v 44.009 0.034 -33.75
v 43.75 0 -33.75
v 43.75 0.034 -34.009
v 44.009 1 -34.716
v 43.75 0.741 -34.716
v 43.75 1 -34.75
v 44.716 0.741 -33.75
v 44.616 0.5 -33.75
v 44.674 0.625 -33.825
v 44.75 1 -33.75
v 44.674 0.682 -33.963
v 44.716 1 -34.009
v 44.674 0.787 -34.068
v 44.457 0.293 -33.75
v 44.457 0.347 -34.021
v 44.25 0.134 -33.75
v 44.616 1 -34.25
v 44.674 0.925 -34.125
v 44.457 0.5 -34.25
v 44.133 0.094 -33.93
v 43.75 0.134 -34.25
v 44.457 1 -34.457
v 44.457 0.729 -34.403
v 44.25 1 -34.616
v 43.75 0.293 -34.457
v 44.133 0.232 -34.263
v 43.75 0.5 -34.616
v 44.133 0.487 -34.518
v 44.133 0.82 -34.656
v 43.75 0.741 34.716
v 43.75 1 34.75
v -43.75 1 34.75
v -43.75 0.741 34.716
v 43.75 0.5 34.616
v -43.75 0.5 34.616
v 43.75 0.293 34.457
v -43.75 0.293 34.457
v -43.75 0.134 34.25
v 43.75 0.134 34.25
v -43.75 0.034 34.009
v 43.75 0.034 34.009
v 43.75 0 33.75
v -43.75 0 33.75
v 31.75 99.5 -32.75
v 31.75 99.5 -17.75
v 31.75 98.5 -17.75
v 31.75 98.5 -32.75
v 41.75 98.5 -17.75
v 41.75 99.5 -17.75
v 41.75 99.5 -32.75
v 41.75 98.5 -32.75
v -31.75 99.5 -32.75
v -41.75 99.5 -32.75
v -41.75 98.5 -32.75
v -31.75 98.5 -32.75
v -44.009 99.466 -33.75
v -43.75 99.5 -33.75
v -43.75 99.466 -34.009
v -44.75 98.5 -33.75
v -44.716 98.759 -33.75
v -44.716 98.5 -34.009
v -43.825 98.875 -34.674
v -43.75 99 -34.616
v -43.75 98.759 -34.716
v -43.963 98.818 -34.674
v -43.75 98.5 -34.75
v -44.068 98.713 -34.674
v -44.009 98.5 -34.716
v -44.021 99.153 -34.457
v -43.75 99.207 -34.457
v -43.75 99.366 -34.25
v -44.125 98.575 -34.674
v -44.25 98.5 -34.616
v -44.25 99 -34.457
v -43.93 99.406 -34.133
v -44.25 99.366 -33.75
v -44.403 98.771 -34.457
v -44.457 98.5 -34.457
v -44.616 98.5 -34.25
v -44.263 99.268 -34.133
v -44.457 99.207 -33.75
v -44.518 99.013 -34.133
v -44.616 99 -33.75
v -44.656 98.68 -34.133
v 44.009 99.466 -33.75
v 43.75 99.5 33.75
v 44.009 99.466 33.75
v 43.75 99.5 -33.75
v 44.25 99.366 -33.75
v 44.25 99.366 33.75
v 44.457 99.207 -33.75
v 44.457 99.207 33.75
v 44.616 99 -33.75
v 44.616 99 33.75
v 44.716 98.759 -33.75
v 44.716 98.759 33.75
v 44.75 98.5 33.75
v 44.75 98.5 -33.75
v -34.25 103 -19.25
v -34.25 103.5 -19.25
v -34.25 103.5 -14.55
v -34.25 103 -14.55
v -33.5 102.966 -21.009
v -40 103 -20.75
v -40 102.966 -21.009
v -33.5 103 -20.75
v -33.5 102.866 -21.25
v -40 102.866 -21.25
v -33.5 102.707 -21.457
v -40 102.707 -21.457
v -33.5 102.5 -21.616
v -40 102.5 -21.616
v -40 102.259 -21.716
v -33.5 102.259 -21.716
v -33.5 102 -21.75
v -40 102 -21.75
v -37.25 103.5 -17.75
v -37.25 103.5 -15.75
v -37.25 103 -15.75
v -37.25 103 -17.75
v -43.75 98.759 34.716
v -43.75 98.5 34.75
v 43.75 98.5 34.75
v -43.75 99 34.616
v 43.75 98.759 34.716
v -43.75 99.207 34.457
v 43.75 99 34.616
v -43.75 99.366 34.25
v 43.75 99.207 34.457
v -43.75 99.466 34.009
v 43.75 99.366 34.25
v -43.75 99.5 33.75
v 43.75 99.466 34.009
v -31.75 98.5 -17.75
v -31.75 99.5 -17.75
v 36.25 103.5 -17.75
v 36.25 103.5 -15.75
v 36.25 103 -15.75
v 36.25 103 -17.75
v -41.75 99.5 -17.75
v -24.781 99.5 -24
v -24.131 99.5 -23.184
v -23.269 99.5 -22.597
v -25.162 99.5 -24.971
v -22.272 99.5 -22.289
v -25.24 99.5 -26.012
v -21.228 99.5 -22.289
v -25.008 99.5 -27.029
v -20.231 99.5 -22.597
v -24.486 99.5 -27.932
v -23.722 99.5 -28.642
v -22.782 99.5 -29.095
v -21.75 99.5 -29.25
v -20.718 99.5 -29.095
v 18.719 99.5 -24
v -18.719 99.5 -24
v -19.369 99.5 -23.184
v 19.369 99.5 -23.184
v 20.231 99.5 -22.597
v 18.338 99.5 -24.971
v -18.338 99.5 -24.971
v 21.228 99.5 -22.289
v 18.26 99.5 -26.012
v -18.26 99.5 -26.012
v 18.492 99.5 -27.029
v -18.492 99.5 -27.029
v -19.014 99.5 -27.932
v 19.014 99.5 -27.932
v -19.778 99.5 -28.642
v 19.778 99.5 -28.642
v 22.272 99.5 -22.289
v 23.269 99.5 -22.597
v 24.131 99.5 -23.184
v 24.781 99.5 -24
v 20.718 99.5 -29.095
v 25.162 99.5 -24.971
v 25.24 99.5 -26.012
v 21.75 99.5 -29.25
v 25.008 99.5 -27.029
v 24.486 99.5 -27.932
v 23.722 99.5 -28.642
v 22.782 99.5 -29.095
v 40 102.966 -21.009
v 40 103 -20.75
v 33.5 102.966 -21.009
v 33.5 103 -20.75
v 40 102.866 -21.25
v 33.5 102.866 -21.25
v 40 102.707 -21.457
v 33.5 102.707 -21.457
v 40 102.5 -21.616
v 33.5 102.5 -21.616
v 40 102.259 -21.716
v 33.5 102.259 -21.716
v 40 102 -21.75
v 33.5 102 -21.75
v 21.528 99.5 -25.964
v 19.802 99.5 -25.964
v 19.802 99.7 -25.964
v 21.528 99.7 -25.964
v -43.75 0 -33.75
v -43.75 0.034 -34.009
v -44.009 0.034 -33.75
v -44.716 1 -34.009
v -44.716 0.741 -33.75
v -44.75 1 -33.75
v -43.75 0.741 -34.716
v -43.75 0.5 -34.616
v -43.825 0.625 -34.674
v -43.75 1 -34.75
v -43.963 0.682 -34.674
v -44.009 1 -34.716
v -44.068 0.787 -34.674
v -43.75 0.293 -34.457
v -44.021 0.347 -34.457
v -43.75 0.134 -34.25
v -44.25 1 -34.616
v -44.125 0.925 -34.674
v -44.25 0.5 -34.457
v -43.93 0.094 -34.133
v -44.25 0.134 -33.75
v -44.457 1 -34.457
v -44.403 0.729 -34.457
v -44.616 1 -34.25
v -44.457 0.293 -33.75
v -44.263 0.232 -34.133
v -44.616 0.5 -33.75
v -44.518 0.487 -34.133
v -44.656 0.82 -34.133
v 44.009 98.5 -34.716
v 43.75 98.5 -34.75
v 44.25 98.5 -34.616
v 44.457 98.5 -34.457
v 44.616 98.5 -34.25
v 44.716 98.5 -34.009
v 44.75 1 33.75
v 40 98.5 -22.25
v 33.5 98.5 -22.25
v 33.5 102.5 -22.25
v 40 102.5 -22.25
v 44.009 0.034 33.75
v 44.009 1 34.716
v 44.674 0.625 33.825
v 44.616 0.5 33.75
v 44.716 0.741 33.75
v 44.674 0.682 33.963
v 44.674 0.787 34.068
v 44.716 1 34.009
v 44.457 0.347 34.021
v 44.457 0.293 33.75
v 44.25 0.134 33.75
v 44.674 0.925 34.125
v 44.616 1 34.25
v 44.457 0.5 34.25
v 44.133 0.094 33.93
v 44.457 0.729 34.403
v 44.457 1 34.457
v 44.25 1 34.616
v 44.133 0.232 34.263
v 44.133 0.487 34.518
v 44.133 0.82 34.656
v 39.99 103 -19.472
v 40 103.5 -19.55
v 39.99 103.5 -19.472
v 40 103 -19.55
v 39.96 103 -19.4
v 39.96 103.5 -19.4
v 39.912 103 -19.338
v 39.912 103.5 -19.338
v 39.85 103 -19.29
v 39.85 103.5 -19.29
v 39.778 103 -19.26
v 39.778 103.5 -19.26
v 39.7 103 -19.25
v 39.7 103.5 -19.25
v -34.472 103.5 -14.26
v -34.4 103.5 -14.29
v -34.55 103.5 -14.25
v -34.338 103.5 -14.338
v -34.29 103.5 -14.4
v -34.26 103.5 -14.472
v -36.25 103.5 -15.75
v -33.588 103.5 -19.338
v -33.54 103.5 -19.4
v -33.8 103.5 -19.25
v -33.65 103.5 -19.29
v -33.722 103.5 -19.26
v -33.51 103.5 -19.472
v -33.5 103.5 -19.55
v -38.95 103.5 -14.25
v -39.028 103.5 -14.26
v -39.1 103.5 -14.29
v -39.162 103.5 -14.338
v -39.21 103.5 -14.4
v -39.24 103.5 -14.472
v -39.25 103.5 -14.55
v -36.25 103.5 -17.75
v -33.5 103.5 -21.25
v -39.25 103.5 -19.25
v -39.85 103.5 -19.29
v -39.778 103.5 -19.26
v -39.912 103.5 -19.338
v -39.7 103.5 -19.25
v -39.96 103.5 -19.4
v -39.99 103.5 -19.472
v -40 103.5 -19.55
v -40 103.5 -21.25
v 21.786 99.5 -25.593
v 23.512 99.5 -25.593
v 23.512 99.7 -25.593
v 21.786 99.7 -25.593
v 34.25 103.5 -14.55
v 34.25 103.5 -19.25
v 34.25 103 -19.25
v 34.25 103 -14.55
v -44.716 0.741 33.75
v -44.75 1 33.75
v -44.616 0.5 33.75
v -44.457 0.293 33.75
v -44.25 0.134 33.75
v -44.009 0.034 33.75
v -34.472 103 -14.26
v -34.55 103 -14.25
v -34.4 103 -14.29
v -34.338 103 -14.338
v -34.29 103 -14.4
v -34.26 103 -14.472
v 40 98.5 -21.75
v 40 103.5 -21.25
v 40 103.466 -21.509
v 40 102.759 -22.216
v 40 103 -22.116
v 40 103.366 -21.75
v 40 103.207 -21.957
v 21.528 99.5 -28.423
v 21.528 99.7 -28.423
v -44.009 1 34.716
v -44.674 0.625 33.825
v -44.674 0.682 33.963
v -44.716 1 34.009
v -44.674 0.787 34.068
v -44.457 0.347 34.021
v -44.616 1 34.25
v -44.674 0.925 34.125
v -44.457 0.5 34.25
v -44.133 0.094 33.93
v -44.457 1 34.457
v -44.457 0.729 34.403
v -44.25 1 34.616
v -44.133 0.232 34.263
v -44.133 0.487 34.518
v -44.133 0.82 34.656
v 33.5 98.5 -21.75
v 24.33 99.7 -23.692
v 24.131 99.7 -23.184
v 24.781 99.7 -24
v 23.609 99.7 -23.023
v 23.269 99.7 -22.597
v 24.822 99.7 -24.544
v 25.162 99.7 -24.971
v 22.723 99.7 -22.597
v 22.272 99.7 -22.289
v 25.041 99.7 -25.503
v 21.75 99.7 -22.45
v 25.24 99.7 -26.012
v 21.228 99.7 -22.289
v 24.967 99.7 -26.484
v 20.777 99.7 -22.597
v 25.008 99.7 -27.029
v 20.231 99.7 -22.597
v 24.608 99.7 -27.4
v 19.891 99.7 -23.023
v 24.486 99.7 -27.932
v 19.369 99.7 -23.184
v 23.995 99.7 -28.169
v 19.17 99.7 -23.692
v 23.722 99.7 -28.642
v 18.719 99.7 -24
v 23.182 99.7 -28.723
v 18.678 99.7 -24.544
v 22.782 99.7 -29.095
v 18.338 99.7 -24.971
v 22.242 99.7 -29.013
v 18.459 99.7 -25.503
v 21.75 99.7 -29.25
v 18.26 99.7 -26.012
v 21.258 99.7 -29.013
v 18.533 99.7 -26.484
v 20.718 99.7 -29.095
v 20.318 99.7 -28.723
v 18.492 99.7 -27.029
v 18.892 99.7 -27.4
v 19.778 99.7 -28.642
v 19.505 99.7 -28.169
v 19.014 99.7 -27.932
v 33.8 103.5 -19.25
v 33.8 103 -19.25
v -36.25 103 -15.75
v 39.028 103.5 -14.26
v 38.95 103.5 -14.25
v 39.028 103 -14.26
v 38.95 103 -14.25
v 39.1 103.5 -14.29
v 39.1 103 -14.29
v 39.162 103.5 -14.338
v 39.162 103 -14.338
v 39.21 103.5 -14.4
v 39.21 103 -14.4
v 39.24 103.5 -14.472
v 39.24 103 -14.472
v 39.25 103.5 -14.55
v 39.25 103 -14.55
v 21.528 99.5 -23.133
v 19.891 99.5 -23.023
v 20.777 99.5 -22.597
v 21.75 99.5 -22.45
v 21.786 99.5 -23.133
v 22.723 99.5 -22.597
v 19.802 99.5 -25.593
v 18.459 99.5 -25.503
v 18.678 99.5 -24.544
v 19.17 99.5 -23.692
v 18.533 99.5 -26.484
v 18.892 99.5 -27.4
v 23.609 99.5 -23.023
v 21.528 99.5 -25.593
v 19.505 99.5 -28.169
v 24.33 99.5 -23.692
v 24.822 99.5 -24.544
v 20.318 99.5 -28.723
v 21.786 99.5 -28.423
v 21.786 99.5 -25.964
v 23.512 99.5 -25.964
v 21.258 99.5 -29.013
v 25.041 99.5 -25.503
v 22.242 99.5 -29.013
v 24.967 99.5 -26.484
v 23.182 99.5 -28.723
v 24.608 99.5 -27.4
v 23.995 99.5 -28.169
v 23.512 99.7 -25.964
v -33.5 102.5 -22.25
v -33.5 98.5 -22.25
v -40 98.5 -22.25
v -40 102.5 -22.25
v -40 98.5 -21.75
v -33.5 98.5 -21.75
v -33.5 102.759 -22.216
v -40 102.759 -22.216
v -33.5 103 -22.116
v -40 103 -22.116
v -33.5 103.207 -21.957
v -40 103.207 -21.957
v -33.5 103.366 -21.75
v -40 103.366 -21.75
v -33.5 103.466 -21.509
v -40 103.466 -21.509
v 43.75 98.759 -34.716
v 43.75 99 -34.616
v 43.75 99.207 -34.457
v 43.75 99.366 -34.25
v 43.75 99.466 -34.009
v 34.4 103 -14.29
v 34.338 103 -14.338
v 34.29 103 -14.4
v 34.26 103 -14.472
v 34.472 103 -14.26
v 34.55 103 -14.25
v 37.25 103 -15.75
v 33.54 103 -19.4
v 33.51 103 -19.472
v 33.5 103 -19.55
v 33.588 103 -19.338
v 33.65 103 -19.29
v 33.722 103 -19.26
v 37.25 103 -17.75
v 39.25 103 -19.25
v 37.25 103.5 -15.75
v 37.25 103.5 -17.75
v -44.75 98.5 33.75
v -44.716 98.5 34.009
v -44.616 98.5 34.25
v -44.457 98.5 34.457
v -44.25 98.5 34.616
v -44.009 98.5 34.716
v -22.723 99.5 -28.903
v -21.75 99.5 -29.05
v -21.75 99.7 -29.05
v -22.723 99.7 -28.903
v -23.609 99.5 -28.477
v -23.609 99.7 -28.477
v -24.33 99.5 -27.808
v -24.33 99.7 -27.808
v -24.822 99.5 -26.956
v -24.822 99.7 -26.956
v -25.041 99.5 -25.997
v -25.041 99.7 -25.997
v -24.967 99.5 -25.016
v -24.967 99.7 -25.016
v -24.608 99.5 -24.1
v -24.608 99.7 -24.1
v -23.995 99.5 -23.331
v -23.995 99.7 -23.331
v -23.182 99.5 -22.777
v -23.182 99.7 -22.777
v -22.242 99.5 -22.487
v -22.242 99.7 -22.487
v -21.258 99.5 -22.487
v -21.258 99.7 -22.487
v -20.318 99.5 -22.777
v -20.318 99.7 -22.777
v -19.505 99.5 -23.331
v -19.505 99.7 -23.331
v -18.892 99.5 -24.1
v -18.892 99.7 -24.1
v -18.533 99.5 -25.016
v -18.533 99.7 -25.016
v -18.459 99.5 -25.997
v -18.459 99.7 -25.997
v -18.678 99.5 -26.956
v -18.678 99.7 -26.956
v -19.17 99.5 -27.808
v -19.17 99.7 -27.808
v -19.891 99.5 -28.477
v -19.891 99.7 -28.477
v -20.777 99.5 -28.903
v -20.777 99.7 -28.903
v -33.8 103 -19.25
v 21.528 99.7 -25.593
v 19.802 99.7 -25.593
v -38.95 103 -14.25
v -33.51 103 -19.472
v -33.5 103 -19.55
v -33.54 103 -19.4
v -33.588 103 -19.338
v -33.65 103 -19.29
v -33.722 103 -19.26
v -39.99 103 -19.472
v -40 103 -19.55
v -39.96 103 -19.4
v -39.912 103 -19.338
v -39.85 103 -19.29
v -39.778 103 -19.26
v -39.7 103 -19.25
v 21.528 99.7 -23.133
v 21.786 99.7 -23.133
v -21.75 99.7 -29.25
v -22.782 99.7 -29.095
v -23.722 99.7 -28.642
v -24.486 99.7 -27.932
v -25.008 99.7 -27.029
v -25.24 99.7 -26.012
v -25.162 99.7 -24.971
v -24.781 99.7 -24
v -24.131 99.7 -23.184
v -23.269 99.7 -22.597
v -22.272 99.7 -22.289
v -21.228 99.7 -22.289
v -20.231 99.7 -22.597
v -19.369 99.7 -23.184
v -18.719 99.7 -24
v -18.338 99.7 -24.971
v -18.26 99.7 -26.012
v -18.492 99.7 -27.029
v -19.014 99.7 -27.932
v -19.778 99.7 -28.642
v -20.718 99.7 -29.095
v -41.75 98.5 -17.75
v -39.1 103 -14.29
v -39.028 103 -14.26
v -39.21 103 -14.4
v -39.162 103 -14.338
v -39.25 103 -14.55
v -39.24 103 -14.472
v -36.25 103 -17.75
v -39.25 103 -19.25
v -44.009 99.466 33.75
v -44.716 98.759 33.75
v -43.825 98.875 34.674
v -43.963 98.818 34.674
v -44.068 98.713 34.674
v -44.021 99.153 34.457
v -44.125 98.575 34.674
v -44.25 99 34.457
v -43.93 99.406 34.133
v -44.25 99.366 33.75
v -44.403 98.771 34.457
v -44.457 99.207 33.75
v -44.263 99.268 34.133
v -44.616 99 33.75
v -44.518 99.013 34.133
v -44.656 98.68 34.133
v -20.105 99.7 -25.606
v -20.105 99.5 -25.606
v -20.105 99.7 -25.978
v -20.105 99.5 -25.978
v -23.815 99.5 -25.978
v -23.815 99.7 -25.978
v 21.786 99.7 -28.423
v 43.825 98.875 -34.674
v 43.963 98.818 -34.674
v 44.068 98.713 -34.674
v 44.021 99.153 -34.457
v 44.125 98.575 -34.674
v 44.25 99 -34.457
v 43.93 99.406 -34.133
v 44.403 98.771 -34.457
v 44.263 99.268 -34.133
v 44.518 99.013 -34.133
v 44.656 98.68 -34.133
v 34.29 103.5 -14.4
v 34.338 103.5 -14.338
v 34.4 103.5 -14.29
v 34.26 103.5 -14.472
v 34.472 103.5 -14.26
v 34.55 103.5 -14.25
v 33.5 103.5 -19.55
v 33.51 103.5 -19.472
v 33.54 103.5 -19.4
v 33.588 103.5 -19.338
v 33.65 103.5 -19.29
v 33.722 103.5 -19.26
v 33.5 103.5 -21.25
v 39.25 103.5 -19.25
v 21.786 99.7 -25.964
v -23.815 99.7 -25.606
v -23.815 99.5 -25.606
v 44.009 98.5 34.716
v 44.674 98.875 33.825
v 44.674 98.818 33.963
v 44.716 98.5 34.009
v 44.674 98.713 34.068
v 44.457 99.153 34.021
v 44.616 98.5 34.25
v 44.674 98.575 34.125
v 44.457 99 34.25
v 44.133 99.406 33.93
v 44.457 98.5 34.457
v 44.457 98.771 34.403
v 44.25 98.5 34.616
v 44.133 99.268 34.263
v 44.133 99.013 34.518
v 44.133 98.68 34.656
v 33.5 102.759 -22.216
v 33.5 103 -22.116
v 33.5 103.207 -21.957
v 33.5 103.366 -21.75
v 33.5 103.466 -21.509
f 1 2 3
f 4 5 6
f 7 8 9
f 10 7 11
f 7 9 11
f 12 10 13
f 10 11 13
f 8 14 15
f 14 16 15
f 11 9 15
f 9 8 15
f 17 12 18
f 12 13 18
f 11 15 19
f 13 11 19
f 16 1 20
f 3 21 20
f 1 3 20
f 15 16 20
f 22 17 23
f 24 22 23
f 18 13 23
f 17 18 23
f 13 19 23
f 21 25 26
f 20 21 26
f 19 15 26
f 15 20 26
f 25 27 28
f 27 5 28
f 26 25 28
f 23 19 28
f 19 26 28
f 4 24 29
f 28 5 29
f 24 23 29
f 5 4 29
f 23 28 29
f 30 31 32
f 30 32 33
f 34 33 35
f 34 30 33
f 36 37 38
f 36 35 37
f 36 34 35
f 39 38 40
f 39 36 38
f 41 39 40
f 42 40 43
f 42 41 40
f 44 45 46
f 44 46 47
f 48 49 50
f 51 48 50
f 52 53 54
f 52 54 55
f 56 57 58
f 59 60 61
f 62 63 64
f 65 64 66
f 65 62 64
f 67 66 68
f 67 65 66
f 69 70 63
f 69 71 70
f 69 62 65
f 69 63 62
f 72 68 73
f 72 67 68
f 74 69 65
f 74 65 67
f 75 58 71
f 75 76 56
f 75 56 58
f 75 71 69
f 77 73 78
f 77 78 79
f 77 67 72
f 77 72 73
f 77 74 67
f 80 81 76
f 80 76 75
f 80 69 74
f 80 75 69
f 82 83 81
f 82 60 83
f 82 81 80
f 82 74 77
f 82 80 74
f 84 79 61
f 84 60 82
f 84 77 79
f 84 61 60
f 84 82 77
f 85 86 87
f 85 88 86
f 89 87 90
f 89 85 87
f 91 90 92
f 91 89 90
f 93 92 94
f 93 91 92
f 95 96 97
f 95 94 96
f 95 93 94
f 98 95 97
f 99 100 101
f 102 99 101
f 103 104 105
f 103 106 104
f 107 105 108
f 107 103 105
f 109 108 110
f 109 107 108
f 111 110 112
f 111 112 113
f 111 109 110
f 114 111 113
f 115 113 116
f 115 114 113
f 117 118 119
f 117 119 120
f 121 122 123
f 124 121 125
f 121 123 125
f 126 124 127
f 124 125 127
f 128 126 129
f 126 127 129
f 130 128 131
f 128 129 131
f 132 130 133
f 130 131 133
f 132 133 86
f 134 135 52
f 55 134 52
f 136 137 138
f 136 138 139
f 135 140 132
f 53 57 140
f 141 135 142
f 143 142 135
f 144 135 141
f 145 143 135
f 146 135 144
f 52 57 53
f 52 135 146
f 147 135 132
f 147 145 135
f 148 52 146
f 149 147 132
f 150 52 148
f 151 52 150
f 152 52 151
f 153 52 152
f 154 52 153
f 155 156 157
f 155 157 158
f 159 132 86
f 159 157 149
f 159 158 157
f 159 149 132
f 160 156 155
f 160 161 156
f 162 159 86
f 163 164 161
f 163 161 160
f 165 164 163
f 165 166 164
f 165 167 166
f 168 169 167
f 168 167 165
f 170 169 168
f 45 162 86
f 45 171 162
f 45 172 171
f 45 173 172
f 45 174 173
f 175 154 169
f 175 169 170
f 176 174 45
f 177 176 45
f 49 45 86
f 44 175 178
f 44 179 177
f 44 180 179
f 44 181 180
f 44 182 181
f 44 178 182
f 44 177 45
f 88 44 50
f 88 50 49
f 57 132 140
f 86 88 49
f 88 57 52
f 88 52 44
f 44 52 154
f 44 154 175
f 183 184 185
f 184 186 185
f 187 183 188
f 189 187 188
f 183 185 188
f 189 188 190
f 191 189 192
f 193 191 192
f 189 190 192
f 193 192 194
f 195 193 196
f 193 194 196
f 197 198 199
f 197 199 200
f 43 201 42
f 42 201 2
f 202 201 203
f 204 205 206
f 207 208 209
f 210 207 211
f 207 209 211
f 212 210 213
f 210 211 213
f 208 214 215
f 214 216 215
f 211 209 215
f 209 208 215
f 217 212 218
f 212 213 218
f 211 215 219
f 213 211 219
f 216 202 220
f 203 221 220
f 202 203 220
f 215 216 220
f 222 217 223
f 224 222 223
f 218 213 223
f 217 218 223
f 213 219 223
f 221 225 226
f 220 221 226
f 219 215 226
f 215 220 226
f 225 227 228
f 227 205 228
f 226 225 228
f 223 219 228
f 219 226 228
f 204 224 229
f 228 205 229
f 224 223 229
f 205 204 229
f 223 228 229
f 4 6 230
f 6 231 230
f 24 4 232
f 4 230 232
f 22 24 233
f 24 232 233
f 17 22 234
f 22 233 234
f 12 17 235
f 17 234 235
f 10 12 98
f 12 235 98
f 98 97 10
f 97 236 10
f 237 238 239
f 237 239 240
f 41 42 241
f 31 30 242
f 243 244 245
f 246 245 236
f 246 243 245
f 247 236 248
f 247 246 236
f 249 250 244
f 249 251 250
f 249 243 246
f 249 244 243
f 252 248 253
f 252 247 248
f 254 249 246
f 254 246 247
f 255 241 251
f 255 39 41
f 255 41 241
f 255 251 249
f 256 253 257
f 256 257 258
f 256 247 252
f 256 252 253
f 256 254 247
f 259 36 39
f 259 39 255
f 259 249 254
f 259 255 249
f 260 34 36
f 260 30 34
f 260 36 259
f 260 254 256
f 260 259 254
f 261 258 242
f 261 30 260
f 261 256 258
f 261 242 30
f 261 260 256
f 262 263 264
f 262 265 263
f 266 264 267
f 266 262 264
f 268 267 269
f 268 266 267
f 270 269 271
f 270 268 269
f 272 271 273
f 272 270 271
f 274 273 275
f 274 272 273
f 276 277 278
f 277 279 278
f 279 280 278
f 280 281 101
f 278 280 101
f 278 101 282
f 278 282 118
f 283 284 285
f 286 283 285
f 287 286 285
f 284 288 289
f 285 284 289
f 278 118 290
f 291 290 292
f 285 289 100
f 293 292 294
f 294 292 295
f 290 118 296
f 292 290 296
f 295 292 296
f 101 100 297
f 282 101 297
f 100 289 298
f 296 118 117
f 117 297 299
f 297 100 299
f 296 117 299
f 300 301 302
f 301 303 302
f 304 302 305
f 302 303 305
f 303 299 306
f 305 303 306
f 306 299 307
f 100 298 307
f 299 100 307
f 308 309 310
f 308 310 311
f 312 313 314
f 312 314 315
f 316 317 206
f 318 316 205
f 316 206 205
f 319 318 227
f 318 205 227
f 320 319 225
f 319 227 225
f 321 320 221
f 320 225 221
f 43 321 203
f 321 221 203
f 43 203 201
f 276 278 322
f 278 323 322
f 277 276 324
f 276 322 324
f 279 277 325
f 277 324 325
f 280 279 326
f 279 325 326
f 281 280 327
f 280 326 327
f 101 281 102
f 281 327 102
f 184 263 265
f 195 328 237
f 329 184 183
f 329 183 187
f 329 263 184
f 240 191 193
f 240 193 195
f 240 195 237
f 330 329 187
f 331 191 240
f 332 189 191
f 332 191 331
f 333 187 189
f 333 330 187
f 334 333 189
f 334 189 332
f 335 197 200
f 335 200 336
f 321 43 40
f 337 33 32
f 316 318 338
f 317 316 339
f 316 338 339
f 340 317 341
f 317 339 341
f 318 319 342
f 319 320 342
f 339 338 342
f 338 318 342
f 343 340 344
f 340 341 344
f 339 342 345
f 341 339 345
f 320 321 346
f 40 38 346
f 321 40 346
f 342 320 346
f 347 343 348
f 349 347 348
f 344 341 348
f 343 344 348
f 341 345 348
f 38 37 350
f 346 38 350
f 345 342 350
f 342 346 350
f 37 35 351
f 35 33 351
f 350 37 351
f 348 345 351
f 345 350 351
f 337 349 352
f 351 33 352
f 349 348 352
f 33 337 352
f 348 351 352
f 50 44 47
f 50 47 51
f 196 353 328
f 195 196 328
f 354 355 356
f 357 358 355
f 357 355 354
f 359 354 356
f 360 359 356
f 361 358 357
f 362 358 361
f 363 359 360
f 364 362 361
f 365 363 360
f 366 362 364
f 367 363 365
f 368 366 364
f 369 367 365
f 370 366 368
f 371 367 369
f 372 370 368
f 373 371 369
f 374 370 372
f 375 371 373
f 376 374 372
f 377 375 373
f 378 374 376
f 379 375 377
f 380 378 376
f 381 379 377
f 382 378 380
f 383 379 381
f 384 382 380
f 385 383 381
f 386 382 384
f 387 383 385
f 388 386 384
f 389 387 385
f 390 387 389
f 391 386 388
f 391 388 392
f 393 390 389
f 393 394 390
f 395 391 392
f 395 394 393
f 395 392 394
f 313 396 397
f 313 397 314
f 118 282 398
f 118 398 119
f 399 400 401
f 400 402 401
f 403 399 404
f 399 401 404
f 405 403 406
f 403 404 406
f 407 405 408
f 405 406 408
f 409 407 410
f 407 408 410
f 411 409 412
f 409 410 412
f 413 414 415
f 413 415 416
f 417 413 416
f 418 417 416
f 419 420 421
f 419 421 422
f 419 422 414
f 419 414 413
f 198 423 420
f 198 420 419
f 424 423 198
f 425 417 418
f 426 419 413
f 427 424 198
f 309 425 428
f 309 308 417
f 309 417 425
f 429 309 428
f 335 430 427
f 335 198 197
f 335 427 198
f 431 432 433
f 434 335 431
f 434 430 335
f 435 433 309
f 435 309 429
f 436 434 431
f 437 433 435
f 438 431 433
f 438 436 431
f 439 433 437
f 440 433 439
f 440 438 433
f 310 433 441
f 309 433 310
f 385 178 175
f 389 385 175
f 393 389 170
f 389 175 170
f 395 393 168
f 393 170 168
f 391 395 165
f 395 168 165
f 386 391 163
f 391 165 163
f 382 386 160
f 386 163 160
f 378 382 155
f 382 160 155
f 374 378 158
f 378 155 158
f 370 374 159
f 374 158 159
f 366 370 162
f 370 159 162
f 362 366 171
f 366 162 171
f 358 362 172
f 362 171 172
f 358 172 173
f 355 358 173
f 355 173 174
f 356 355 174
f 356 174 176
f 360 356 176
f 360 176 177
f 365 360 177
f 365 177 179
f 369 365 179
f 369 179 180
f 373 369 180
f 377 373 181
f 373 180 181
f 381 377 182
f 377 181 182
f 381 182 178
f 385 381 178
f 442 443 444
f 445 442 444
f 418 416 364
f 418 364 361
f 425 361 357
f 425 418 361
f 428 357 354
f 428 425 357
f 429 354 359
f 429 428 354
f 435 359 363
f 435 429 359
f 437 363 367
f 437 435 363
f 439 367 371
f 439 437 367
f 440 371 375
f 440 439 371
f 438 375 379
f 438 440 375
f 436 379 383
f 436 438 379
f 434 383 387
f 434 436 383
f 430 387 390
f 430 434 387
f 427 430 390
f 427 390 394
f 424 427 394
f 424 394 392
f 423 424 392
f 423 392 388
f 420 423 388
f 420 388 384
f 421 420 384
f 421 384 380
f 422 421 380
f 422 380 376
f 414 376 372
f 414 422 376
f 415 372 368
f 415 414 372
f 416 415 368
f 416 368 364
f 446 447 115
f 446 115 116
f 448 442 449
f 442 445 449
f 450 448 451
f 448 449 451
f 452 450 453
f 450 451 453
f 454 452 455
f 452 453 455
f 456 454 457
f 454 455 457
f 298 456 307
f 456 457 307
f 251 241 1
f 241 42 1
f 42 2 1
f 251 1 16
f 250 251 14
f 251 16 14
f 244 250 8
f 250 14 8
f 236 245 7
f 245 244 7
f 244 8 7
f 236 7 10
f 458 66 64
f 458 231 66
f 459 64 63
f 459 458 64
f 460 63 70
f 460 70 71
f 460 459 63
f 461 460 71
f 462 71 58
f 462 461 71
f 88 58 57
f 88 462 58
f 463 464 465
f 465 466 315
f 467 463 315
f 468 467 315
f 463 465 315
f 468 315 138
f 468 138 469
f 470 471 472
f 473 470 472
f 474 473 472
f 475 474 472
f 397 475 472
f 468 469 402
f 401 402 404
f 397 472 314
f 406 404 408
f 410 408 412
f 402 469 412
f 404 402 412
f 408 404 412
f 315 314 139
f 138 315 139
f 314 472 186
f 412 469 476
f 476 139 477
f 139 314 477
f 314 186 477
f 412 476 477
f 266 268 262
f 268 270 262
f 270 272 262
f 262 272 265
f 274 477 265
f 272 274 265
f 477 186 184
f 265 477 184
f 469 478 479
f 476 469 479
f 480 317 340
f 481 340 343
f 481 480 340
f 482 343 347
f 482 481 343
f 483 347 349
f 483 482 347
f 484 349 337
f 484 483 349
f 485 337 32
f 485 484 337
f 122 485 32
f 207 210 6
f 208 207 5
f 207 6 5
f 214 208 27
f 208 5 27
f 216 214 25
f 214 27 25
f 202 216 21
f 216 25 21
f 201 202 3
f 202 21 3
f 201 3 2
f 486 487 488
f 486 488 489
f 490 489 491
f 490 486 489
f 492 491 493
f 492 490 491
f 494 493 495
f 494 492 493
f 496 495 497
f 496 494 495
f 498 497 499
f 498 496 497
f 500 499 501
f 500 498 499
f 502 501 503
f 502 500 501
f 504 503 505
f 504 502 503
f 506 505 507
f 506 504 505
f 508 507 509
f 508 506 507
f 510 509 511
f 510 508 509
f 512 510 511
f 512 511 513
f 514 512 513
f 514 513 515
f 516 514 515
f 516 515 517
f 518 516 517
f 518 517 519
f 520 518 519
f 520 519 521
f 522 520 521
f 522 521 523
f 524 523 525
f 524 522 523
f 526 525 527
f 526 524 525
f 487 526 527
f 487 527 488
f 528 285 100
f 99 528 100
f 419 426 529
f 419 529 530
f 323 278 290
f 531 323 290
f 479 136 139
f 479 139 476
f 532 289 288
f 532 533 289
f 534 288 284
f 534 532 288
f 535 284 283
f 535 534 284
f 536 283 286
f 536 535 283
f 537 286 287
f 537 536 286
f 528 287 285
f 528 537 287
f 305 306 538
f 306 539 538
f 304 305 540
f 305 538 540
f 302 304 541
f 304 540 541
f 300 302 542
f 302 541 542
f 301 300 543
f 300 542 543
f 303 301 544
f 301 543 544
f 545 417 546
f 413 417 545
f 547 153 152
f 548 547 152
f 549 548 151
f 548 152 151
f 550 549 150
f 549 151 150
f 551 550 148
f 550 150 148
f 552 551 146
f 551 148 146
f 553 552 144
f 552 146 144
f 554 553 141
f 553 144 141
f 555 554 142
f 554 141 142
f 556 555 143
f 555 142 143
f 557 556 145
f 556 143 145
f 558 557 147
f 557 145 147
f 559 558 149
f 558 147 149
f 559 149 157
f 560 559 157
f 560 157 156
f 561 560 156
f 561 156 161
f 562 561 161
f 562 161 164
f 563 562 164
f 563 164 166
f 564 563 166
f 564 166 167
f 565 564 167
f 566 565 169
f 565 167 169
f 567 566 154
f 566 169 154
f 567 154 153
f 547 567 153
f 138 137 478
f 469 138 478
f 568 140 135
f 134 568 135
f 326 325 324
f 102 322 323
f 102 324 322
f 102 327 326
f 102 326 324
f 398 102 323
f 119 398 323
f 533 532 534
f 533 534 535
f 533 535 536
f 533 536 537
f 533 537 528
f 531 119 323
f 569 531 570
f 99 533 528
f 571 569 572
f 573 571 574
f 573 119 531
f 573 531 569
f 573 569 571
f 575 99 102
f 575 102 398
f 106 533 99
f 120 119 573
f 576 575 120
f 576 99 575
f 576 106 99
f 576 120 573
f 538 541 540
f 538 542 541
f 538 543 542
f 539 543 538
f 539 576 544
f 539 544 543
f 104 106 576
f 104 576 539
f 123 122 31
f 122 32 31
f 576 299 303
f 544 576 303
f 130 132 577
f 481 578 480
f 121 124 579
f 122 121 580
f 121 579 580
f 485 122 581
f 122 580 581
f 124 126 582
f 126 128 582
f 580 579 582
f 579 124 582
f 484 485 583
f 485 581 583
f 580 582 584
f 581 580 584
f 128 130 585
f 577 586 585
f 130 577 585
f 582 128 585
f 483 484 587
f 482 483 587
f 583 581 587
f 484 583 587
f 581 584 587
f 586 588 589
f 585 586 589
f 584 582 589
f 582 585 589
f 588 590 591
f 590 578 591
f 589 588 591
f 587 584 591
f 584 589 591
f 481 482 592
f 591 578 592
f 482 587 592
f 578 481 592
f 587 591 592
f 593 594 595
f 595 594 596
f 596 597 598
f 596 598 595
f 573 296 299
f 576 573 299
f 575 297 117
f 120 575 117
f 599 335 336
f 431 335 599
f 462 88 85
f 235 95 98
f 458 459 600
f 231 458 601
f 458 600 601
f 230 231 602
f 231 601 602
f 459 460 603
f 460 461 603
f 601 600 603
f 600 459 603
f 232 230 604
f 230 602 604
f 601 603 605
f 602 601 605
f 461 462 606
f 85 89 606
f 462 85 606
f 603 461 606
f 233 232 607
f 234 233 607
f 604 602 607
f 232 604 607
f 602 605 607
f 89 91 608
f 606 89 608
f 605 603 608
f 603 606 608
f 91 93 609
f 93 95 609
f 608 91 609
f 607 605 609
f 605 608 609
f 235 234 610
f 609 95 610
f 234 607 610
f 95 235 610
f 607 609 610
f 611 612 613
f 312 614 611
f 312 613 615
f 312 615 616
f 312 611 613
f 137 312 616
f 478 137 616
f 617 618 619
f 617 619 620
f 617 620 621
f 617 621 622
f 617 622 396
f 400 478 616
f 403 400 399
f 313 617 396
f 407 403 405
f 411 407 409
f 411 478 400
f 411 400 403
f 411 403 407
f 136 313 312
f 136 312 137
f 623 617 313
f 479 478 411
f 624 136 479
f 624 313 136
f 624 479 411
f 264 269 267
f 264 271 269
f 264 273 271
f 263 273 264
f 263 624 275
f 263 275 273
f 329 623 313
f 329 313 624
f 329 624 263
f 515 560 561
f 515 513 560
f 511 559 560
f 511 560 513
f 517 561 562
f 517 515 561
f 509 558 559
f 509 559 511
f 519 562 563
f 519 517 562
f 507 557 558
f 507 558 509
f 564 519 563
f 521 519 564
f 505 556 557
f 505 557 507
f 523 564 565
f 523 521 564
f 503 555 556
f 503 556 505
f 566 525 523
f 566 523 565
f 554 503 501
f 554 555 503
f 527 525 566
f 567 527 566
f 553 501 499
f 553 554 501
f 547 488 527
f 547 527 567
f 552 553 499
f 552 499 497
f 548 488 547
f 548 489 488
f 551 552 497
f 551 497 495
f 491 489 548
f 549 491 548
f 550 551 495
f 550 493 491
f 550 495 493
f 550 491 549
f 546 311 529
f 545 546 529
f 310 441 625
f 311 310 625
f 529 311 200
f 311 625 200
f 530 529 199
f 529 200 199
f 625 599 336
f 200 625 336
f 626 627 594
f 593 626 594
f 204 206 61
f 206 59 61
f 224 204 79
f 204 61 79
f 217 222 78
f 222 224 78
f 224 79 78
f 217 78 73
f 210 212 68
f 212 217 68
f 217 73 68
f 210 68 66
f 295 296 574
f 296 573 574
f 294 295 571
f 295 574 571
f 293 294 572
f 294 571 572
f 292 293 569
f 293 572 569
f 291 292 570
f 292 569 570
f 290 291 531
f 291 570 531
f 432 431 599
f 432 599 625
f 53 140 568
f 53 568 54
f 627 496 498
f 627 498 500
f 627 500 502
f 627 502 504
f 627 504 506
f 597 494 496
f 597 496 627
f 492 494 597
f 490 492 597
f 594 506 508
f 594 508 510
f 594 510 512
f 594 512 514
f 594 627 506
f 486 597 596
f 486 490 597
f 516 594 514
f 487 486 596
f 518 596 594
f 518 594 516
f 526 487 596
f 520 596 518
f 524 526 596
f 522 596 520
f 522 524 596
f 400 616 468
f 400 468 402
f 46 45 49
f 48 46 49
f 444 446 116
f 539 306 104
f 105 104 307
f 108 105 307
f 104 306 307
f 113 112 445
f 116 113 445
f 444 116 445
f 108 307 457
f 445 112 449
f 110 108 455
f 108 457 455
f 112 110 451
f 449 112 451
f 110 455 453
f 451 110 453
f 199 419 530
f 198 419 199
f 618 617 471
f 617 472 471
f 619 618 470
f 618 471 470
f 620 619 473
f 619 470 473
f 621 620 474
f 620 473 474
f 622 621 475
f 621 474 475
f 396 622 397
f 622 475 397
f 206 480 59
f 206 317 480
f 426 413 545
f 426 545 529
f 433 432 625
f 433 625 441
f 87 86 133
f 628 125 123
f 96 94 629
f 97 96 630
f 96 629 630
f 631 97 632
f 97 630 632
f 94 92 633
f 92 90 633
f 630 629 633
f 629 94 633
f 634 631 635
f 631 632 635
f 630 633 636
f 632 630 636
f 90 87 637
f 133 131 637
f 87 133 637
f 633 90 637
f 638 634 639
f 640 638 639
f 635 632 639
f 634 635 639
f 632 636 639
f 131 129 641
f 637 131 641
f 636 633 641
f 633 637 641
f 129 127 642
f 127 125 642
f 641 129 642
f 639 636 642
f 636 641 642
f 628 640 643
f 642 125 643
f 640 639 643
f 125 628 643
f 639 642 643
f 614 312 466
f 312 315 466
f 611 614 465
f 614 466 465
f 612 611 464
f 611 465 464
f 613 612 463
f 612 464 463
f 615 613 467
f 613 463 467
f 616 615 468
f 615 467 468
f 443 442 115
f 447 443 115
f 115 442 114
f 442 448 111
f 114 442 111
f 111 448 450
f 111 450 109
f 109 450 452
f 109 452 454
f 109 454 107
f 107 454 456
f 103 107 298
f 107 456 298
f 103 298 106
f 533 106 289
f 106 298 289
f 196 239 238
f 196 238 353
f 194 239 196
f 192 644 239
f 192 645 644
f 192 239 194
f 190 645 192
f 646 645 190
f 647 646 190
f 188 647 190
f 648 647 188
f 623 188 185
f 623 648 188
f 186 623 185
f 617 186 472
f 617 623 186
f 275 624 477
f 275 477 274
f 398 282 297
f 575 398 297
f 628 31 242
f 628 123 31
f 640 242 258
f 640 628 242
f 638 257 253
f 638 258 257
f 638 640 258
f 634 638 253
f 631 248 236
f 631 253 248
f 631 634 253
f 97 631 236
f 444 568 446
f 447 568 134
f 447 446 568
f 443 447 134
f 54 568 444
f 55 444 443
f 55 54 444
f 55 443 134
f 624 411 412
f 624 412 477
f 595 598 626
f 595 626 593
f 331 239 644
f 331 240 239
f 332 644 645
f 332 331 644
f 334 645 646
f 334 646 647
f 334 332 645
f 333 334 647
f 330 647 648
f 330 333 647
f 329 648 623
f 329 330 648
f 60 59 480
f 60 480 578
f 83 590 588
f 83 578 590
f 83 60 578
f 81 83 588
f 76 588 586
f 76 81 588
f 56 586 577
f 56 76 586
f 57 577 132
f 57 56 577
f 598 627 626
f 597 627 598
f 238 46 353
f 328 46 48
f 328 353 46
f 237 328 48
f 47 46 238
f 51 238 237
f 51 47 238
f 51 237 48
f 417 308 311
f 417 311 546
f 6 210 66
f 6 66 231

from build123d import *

# Parameters (mm, degrees)
SKETCH_1_W             = 89.5
SKETCH_1_H             = 69.5
EXTRUDE_1_DEPTH        = 99.5
SKETCH_2_W             = 10
SKETCH_2_H             = 15
CUT_EXTRUDE_1_DEPTH    = 1
FILLET_1_R             = 1
SKETCH_3_W             = 6.5
SKETCH_3_H             = 0.5
EXTRUDE_2_DEPTH        = 5
SKETCH_4_W             = 1
SKETCH_4_H             = 2
EXTRUDE_3_DEPTH        = 0.5
FILLET_2_R             = 1
FILLET_3_R             = 0.3
FILLET_2_OF_MIRROR_1_R = 1
FILLET_3_OF_MIRROR_1_R = 0.3
SKETCH_5_W             = 3.710206691
SKETCH_5_H             = 0.372043469
EXTRUDE_4_DEPTH        = 0.2
SKETCH_6_R             = 3.5
SKETCH_6_R_2           = 3.3
EXTRUDE_5_DEPTH        = 0.2


with BuildPart() as part:
    # 草图1 → 凸台-拉伸1 (new body)
    with BuildSketch(Plane(origin=(0, 0, 0), x_dir=(1, 0, 0), z_dir=(0, 1, 0))):
        Rectangle(SKETCH_1_W, SKETCH_1_H)
    extrude(amount=EXTRUDE_1_DEPTH)

    # 草图2 → 切除-拉伸1 (cut)
    with BuildSketch(Plane(origin=(0, 99.5, 0), x_dir=(1, 0, 0), z_dir=(0, 1, 0))):
        with Locations((-36.75, 25.25)):
            Rectangle(SKETCH_2_W, SKETCH_2_H)
        with Locations((36.75, 25.25)):
            Rectangle(SKETCH_2_W, SKETCH_2_H)
    extrude(amount=-CUT_EXTRUDE_1_DEPTH, mode=Mode.SUBTRACT)

    # 圆角1
    fillet_1_edges = [part.edges().sort_by_distance(p)[0] for p in [
        (-44.75, 99.5, 0),
        (0, 99.5, 34.75),
        (44.75, 99.5, 0),
        (0, 0, 34.75),
        (-44.75, 0, 0),
        (0, 0, -34.75),
        (44.75, 0, 0),
        (0, 99.5, -34.75),
        (44.75, 49.75, 34.75),
        (-44.75, 49.75, 34.75),
        (-44.75, 49.75, -34.75),
        (44.75, 49.75, -34.75),
    ]]
    fillet(fillet_1_edges, radius=FILLET_1_R)

    # 草图3 → 凸台-拉伸2 (add)
    with BuildSketch(Plane(origin=(0, 98.5, 0), x_dir=(1, 0, 0), z_dir=(0, 1, 0))):
        with Locations((36.75, 22)):
            Rectangle(SKETCH_3_W, SKETCH_3_H)
    extrude_2 = extrude(amount=EXTRUDE_2_DEPTH)

    # 草图4 → 凸台-拉伸3 (add)
    with BuildSketch(Plane(origin=(0, 103.5, 0), x_dir=(1, 0, 0), z_dir=(0, 1, 0))):
        Polygon((33.5, 21.75), (33.5, 19.25), (34.25, 19.25), (34.25, 14.25), (39.25, 14.25), (39.25, 19.25), (40, 19.25), (40, 21.75), align=None)
        with Locations((36.75, 16.75)):
            Rectangle(SKETCH_4_W, SKETCH_4_H, mode=Mode.SUBTRACT)
    extrude_3 = extrude(amount=-EXTRUDE_3_DEPTH)

    # 圆角2
    fillet_2_edges = [part.edges().sort_by_distance(p)[0] for p in [
        (36.75, 103.5, -22.25),
        (36.75, 103, -21.75),
    ]]
    fillet(fillet_2_edges, radius=FILLET_2_R)

    # 圆角3
    fillet_3_edges = [part.edges().sort_by_distance(p)[0] for p in [
        (40, 103.25, -19.25),
        (39.25, 103.25, -14.25),
        (34.25, 103.25, -14.25),
        (33.5, 103.25, -19.25),
    ]]
    fillet(fillet_3_edges, radius=FILLET_3_R)

    # 镜向1: 凸台-拉伸2, 凸台-拉伸3 across plane
    add(extrude_2.mirror(Plane(origin=(0, 0, 0), x_dir=(0, 0, 1), z_dir=(1, 0, 0))))
    add(extrude_3.mirror(Plane(origin=(0, 0, 0), x_dir=(0, 0, 1), z_dir=(1, 0, 0))))

    # 圆角2 of 镜向1
    fillet_2_of_mirror_1_edges = [part.edges().sort_by_distance(p)[0] for p in [
        (-36.75, 103.5, -22.25),
        (-36.75, 103, -21.75),
    ]]
    fillet(fillet_2_of_mirror_1_edges, radius=FILLET_2_OF_MIRROR_1_R)

    # 圆角3 of 镜向1
    fillet_3_of_mirror_1_edges = [part.edges().sort_by_distance(p)[0] for p in [
        (-40, 103.25, -19.25),
        (-39.25, 103.25, -14.25),
        (-34.25, 103.25, -14.25),
        (-33.5, 103.25, -19.25),
    ]]
    fillet(fillet_3_of_mirror_1_edges, radius=FILLET_3_OF_MIRROR_1_R)

    # 草图5 → 凸台-拉伸4 (add)
    with BuildSketch(Plane(origin=(0, 99.5, 0), x_dir=(1, 0, 0), z_dir=(0, 1, 0))):
        Polygon((21.528027711, 25.963655783), (21.528027711, 28.423489578), (21.78628469, 28.423489578), (21.78628469, 25.963655783), (23.512259546, 25.963655783), (23.512259546, 25.592890813), (21.78628469, 25.592890813), (21.78628469, 23.133057018), (21.528027711, 23.133057018), (21.528027711, 25.592890813), (19.802052855, 25.592890813), (19.802052855, 25.963655783), align=None)
        with Locations((-21.959689363, 25.792257863)):
            Rectangle(SKETCH_5_W, SKETCH_5_H)
    extrude(amount=EXTRUDE_4_DEPTH)

    # 草图6 → 凸台-拉伸5 (add)
    # profile 1 of 2: a face of its own
    with BuildSketch(Plane(origin=(0, 99.5, 0), x_dir=(1, 0, 0), z_dir=(0, 1, 0))):
        with Locations(Location((21.75, 25.75, 0), (0, 0, 90))):
            Circle(SKETCH_6_R)
        with Locations(Location((21.75, 25.75, 0), (0, 0, 270))):
            Circle(SKETCH_6_R_2, mode=Mode.SUBTRACT)
    # profile 2 of 2: a face of its own
    with BuildSketch(Plane(origin=(0, 99.5, 0), x_dir=(1, 0, 0), z_dir=(0, 1, 0))):
        with Locations(Location((-21.75, 25.75, 0), (0, 0, 90))):
            Circle(SKETCH_6_R)
        with Locations(Location((-21.75, 25.75, 0), (0, 0, 90))):
            Circle(SKETCH_6_R_2, mode=Mode.SUBTRACT)
    extrude(amount=EXTRUDE_5_DEPTH)


solid = part.part
